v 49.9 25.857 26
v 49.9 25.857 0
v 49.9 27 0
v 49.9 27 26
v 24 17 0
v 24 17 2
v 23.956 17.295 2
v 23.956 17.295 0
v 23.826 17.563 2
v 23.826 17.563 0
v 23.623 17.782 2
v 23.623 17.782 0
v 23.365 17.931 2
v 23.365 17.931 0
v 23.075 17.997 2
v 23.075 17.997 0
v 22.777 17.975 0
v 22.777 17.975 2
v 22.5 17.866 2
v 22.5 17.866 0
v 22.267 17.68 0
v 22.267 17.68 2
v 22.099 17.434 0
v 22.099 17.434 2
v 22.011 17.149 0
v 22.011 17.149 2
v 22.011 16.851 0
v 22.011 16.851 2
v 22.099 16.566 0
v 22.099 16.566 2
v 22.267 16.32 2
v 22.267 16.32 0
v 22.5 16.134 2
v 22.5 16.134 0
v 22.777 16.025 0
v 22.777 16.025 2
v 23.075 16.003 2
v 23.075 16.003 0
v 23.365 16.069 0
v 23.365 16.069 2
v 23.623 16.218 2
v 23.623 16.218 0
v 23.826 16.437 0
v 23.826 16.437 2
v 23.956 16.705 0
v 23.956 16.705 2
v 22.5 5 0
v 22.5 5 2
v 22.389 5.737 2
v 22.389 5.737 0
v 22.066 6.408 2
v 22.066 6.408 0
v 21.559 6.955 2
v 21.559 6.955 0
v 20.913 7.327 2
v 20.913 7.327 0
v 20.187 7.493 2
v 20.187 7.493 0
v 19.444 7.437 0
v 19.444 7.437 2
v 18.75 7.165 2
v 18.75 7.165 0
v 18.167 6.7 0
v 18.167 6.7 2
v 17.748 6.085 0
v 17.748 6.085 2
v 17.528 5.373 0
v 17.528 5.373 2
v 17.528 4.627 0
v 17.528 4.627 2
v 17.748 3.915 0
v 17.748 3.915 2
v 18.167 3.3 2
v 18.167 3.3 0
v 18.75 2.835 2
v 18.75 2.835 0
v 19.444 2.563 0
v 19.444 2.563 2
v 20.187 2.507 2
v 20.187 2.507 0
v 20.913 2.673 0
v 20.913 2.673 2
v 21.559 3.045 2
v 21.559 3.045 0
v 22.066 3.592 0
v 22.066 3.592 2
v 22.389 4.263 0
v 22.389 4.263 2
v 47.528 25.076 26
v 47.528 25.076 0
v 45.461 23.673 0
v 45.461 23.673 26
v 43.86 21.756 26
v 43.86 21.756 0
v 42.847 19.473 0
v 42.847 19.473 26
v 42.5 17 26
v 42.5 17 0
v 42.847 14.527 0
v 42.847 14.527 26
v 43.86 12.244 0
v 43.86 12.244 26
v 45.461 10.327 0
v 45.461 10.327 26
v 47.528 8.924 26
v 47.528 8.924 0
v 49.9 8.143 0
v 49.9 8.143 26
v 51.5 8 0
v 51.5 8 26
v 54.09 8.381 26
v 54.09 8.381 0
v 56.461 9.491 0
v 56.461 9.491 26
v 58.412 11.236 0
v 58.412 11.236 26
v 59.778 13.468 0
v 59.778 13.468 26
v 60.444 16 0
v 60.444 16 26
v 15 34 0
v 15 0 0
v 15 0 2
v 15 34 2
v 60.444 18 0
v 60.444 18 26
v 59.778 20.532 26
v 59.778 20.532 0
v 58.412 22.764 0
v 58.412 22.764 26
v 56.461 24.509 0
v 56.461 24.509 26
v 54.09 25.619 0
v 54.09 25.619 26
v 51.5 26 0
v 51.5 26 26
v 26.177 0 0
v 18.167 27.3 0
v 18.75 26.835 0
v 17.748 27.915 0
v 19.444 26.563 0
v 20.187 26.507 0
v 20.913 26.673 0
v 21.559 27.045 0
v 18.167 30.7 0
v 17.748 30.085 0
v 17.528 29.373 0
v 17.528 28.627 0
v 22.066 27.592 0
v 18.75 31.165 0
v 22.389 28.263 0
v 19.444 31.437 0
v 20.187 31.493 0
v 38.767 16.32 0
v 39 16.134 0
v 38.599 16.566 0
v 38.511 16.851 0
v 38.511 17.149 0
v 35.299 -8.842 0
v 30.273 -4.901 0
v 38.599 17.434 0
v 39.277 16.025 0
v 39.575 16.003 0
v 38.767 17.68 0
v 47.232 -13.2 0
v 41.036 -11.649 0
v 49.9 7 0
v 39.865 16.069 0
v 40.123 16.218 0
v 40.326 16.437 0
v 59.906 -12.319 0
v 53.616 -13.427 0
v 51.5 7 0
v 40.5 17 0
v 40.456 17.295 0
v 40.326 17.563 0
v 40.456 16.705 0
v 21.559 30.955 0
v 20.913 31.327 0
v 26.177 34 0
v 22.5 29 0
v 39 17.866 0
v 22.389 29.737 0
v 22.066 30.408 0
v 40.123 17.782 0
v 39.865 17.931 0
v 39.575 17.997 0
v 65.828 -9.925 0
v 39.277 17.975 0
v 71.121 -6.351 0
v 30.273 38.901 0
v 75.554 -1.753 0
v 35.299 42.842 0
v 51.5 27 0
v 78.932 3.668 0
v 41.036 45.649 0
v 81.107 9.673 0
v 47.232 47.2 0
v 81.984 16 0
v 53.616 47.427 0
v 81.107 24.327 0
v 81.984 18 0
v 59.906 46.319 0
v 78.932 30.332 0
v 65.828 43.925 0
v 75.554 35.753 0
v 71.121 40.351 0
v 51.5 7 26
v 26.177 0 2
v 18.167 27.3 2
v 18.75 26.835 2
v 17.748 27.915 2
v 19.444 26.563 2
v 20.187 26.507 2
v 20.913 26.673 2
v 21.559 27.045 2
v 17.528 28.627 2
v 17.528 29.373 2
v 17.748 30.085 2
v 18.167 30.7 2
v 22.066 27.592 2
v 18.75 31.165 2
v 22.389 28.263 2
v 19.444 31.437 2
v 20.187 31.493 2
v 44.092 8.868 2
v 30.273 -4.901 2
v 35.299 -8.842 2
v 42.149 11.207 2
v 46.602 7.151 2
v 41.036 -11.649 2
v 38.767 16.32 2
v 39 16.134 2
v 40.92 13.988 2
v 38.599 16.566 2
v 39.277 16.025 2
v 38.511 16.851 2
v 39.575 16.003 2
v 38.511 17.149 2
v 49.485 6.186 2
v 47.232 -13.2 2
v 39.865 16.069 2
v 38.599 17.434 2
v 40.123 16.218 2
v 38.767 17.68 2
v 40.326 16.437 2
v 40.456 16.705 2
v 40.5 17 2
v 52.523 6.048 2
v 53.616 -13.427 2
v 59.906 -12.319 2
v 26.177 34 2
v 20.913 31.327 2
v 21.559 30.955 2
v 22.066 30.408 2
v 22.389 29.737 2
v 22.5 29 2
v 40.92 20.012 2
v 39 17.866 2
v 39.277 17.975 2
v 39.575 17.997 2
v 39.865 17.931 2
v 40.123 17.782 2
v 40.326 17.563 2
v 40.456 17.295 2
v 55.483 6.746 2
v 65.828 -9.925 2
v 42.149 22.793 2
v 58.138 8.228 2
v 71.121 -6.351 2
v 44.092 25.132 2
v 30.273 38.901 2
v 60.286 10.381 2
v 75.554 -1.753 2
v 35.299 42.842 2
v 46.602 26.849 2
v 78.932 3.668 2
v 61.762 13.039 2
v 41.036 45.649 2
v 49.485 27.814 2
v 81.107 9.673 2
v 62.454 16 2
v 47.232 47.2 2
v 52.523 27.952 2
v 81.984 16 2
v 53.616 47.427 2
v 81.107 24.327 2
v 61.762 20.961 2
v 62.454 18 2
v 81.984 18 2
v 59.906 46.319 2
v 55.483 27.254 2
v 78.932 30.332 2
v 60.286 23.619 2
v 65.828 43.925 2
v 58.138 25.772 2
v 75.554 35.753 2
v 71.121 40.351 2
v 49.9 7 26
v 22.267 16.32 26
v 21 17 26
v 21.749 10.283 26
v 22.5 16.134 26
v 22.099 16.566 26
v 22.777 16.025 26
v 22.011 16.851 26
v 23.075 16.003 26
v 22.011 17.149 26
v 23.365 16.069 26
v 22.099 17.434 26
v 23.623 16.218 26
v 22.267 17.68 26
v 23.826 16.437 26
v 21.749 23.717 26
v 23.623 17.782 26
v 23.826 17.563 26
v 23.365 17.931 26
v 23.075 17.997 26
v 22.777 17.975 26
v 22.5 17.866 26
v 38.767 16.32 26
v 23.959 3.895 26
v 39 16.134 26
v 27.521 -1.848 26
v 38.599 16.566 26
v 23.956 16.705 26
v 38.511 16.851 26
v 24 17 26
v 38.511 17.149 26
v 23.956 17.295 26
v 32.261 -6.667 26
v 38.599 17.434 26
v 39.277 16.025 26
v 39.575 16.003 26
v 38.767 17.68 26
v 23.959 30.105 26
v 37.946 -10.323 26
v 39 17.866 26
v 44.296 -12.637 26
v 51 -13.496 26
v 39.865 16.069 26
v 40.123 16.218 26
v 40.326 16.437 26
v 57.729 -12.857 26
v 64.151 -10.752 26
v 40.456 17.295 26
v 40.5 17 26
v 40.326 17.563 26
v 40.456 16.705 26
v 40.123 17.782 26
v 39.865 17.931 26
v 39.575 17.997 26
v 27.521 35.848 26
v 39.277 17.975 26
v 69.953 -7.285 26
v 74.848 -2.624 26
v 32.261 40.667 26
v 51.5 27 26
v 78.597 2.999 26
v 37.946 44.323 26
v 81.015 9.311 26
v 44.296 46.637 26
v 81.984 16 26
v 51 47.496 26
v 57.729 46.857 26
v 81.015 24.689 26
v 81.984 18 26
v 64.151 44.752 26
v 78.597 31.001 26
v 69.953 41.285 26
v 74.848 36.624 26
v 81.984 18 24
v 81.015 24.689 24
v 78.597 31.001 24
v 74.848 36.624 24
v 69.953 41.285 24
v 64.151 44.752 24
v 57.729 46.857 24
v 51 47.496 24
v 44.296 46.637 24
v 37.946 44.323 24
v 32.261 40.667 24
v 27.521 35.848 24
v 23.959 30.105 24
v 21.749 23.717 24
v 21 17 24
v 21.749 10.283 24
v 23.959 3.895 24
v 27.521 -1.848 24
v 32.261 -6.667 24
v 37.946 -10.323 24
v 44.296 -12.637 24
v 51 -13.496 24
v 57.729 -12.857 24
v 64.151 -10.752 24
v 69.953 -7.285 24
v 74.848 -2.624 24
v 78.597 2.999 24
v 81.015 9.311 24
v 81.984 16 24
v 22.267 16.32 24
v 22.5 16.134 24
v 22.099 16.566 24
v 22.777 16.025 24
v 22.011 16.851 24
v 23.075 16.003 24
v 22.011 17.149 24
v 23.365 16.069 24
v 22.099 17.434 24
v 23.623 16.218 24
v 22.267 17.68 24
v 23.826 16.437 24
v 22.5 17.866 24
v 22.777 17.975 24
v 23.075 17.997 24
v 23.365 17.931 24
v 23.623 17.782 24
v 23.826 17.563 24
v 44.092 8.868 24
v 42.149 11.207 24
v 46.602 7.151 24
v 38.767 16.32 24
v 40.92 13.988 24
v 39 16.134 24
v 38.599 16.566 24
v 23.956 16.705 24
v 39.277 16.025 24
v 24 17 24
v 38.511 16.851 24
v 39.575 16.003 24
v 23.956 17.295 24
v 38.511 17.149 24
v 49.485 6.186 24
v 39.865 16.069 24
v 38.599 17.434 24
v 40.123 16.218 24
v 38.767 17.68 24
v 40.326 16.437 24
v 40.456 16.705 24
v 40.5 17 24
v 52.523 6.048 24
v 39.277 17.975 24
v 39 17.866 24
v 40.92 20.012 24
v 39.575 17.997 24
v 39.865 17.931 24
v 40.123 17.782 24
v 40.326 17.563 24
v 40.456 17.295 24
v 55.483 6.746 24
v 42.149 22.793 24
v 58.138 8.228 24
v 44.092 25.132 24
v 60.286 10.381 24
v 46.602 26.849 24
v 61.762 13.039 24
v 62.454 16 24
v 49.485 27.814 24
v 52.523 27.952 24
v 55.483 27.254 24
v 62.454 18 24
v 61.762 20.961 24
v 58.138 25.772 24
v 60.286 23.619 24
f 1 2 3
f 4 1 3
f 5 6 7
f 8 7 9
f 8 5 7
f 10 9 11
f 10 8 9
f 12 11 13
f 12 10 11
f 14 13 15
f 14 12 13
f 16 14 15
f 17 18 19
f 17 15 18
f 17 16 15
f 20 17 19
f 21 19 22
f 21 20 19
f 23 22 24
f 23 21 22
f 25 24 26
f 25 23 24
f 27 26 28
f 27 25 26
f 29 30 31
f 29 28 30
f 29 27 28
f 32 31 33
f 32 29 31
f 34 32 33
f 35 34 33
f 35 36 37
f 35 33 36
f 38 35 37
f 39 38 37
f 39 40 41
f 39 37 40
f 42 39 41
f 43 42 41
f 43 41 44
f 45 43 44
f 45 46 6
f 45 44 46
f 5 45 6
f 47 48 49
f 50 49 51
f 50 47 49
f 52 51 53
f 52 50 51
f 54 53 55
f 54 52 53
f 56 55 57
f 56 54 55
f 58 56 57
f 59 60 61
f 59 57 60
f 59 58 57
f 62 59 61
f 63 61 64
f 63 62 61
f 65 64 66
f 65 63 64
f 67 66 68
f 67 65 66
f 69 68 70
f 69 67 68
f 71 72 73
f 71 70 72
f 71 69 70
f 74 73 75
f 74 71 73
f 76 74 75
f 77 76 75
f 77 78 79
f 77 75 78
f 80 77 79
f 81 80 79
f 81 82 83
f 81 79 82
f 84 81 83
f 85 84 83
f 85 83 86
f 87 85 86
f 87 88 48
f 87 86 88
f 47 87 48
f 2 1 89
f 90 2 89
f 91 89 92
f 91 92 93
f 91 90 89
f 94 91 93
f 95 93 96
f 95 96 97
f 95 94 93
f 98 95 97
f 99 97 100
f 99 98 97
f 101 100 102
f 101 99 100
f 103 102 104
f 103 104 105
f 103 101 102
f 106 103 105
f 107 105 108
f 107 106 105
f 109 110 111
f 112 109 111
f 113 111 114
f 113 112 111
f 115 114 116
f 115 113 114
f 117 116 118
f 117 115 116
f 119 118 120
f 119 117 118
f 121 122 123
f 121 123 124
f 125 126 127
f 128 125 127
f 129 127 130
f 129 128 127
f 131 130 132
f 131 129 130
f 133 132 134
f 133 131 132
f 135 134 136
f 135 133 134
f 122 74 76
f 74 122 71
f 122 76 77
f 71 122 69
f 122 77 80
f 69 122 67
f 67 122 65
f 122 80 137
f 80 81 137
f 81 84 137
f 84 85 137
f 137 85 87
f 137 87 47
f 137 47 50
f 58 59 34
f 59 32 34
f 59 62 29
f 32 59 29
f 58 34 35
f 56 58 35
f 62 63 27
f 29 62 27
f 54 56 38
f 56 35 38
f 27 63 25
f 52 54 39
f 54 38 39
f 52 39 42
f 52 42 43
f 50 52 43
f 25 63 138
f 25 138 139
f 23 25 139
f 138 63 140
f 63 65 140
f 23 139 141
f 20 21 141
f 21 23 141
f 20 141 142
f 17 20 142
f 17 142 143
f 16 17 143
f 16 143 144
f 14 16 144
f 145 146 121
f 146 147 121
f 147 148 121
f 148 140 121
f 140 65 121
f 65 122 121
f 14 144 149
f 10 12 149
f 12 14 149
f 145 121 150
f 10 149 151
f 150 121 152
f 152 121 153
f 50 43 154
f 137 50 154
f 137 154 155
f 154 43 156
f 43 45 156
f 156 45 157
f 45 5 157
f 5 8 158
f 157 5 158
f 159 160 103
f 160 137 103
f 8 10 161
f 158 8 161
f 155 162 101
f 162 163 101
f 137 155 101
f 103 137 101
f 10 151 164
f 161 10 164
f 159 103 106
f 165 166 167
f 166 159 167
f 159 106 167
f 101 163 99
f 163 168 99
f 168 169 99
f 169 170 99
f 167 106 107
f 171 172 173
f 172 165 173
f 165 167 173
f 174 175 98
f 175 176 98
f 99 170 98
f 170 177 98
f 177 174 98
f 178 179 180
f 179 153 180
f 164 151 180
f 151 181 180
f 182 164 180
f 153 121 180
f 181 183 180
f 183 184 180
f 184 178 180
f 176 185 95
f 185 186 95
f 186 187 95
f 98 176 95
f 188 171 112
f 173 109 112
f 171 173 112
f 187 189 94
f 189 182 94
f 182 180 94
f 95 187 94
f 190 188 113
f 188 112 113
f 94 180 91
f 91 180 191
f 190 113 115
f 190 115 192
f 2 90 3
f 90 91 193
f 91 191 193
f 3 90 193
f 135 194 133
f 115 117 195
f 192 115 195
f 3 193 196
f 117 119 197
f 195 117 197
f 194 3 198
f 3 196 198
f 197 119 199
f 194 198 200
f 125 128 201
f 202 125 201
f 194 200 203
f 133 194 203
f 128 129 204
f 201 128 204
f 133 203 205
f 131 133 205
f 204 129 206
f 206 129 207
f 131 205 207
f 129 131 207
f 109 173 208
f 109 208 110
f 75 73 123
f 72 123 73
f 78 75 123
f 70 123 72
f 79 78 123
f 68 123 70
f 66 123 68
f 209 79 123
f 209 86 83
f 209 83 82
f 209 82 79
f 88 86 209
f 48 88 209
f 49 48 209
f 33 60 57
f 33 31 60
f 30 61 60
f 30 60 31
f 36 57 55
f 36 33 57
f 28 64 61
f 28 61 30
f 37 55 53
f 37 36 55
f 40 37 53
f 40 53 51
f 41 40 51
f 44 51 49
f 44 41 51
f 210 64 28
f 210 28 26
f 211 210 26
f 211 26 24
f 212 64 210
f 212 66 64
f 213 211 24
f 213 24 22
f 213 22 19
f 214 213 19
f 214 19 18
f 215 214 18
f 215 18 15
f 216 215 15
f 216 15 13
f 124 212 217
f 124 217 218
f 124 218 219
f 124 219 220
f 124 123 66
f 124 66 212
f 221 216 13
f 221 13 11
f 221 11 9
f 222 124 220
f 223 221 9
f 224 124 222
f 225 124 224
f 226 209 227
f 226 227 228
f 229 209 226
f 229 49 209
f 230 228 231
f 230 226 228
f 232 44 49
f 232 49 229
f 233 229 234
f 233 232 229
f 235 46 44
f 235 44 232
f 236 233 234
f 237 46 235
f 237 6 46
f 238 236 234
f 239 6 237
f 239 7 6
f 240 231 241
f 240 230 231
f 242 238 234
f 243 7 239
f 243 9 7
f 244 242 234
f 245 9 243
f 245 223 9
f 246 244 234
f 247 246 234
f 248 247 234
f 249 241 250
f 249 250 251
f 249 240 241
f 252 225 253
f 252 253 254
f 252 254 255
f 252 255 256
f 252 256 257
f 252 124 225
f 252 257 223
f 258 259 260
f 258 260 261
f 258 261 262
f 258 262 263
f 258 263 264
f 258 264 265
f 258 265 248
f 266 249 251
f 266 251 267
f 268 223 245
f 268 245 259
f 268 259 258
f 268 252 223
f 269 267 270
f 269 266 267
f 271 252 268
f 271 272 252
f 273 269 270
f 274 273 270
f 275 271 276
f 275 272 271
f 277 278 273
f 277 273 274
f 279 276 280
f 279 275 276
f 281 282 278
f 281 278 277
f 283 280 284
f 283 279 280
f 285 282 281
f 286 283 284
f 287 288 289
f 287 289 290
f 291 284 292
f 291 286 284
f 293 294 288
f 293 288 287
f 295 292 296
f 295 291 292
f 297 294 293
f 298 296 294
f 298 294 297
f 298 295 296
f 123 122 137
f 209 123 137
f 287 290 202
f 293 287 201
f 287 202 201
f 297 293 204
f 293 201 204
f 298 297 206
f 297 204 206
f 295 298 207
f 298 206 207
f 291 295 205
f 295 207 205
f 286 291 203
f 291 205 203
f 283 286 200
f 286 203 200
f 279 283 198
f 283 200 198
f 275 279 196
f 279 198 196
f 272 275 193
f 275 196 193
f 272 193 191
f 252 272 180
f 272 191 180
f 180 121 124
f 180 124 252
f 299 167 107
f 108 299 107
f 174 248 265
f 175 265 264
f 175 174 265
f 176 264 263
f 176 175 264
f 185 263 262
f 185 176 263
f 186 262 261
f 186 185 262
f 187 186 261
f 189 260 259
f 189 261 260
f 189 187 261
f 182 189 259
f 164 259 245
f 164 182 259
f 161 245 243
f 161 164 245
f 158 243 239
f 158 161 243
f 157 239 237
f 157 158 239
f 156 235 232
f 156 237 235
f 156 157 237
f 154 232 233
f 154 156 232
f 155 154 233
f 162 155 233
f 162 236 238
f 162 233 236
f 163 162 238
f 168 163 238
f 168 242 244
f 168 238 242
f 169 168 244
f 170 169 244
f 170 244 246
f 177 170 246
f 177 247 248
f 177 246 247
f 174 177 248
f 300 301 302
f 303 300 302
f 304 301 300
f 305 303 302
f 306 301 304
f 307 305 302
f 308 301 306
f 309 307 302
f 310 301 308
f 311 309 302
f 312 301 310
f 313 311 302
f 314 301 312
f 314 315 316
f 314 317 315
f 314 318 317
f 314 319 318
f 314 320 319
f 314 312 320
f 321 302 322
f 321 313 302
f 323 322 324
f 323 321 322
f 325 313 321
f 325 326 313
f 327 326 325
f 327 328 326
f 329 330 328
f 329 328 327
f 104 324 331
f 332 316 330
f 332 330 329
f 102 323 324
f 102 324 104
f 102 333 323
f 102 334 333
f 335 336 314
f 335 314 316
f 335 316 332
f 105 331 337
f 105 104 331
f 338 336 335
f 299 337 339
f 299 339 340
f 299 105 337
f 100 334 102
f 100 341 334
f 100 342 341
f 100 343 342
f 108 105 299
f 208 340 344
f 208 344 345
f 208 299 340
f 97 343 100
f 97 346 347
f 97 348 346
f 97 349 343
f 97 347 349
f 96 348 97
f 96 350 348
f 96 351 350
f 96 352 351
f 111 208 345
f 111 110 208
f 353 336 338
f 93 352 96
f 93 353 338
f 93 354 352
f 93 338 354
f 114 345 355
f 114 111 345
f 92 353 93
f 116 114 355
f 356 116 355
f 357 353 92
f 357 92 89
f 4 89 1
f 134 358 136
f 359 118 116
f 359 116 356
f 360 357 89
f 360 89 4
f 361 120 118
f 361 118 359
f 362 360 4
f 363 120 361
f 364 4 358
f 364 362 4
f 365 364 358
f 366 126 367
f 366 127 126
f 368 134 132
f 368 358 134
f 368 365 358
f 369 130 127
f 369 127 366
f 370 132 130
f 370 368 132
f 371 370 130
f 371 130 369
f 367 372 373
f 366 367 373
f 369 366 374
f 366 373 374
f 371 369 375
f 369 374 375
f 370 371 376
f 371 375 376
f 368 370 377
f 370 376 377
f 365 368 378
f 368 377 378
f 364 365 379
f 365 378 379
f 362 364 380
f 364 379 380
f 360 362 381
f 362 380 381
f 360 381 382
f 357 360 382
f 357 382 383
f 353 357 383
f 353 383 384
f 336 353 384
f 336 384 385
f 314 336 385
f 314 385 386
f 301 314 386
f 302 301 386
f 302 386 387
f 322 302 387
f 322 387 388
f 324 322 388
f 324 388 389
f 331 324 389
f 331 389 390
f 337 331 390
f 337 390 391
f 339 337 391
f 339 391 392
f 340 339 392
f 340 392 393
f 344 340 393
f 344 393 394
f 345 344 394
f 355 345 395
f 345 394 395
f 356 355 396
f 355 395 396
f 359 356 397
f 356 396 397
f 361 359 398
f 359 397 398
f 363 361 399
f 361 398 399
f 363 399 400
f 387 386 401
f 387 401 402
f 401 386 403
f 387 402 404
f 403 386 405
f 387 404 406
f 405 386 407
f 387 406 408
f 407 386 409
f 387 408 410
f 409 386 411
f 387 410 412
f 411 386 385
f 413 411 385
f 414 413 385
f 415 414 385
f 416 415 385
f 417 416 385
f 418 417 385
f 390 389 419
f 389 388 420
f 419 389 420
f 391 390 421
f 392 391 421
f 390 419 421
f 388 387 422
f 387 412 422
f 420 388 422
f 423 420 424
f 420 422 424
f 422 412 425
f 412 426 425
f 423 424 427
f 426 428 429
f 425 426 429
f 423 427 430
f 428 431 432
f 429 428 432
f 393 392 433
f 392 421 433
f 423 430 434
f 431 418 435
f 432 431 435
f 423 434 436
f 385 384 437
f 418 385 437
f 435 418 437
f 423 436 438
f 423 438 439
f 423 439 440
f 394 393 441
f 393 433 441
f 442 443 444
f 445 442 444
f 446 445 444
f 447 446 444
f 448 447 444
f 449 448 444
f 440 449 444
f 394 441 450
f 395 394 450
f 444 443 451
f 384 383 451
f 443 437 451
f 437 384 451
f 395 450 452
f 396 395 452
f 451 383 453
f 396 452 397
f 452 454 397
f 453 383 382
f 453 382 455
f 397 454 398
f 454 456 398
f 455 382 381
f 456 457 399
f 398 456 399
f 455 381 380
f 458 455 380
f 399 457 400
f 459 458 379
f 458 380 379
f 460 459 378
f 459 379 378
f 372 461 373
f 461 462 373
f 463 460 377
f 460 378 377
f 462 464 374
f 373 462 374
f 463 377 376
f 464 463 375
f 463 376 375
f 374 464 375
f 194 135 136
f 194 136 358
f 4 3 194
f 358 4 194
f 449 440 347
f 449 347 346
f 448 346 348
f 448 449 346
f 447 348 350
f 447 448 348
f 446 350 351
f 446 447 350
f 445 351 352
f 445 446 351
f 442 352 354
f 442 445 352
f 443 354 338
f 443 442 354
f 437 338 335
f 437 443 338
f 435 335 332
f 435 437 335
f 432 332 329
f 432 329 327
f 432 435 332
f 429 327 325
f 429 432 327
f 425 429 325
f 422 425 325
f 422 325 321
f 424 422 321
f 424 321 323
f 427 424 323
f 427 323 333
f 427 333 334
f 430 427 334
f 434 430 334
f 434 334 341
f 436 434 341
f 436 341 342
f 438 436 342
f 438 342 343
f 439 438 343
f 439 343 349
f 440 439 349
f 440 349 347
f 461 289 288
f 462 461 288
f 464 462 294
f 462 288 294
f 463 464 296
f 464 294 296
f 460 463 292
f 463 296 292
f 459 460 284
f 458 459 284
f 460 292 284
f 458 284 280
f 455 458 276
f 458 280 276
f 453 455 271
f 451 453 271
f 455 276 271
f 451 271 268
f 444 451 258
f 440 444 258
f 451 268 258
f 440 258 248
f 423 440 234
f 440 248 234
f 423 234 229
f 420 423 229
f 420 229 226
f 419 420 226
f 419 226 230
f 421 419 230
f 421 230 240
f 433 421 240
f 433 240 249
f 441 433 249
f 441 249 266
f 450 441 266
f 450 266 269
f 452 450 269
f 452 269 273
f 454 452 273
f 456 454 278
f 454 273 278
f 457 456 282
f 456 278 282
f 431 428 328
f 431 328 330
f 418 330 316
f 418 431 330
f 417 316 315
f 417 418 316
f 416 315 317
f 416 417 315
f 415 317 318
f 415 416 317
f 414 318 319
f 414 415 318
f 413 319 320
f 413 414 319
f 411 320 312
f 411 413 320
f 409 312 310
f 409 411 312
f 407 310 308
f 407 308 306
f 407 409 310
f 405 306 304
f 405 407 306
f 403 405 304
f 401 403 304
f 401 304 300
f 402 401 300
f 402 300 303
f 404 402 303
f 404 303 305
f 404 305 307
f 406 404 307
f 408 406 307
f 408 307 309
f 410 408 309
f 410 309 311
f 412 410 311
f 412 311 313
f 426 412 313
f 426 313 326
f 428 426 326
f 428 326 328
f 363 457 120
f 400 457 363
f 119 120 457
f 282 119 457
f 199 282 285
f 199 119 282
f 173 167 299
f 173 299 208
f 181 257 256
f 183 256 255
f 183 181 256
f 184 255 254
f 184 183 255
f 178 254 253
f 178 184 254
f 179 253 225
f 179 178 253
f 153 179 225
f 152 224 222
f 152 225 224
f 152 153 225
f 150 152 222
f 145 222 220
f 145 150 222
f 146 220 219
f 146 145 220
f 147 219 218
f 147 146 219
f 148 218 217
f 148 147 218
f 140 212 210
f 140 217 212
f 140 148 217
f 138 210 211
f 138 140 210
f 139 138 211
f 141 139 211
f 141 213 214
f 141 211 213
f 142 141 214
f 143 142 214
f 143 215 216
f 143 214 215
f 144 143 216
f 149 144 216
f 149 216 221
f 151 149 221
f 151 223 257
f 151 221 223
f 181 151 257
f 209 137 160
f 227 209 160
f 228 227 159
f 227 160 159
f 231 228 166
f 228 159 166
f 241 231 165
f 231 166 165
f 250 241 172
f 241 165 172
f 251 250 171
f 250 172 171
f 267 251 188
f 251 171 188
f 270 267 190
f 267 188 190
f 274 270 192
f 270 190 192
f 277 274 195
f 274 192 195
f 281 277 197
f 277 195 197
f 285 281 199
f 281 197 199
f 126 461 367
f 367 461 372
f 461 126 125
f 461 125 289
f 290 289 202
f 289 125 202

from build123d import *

# Parameters (mm, degrees)
CYLINDER018_R     = 1
CYLINDER018_DEPTH = 26
CYLINDER019_R     = 1
CYLINDER019_DEPTH = 26
BOX007_W          = 30
BOX007_H          = 2
BOX007_DEPTH      = 26
CYLINDER016_R     = 2.5
CYLINDER016_DEPTH = 10
CYLINDER017_R     = 2.5
CYLINDER017_DEPTH = 10
BOX005_W          = 15
BOX005_H          = 34
BOX005_DEPTH      = 2
BOX004_W          = 1.6
BOX004_H          = 20
BOX004_DEPTH      = 26
CYLINDER010_R     = 11
CYLINDER010_DEPTH = 22
CYLINDER009_R     = 30.5
CYLINDER009_DEPTH = 22
CYLINDER008_R     = 9
CYLINDER008_DEPTH = 26
CYLINDER007_R     = 30.5
CYLINDER007_DEPTH = 26


with BuildPart() as cylinder018:
    # Cylinder018 → Cylinder018 (new body)
    with BuildSketch(Plane(origin=(39.5, 17, 0), x_dir=(1, 0, 0), z_dir=(0, 0, 1))):
        Circle(CYLINDER018_R)
    extrude(amount=CYLINDER018_DEPTH)


with BuildPart() as wireholes:
    # Cylinder019 → Cylinder019 (new body)
    with BuildSketch(Plane(origin=(23, 17, 0), x_dir=(1, 0, 0), z_dir=(0, 0, 1))):
        Circle(CYLINDER019_R)
    extrude(amount=CYLINDER019_DEPTH)

    # Fusion007: union Cylinder018
    add(cylinder018.part)


with BuildPart() as cube007:
    # Box007 → Box007 (new body)
    with BuildSketch(Plane(origin=(53, 16, 0), x_dir=(1, 0, 0), z_dir=(0, 0, 1))):
        with Locations((15, 1)):
            Rectangle(BOX007_W, BOX007_H)
    extrude(amount=BOX007_DEPTH)


with BuildPart() as cylinder016:
    # Cylinder016 → Cylinder016 (new body)
    with BuildSketch(Plane(origin=(20, 5, 0), x_dir=(1, 0, 0), z_dir=(0, 0, 1))):
        Circle(CYLINDER016_R)
    extrude(amount=CYLINDER016_DEPTH)


with BuildPart() as boreholem6screws002:
    # Cylinder017 → Cylinder017 (new body)
    with BuildSketch(Plane(origin=(20, 29, 0), x_dir=(1, 0, 0), z_dir=(0, 0, 1))):
        Circle(CYLINDER017_R)
    extrude(amount=CYLINDER017_DEPTH)

    # Fusion005: union Cylinder016
    add(cylinder016.part)


with BuildPart() as cut010:
    # Box005 → Box005 (new body)
    with BuildSketch(Plane(origin=(15, 0, 0), x_dir=(1, 0, 0), z_dir=(0, 0, 1))):
        with Locations((7.5, 17)):
            Rectangle(BOX005_W, BOX005_H)
    extrude(amount=BOX005_DEPTH)

    # Cut010: cut BoreholeM6Screws002
    add(boreholem6screws002.part, mode=Mode.SUBTRACT)


with BuildPart() as cube004:
    # Box004 → Box004 (new body)
    with BuildSketch(Plane(origin=(49.9, 7, 0), x_dir=(1, 0, 0), z_dir=(0, 0, 1))):
        with Locations((0.8, 10)):
            Rectangle(BOX004_W, BOX004_H)
    extrude(amount=BOX004_DEPTH)


with BuildPart() as cylinder010:
    # Cylinder010 → Cylinder010 (new body)
    with BuildSketch(Plane.XY):
        Circle(CYLINDER010_R)
    extrude(amount=CYLINDER010_DEPTH)


with BuildPart() as coilarea:
    # Cylinder009 → Cylinder009 (new body)
    with BuildSketch(Plane.XY):
        Circle(CYLINDER009_R)
    extrude(amount=CYLINDER009_DEPTH)

    # Cut004: cut Cylinder010
    add(cylinder010.part, mode=Mode.SUBTRACT)


with BuildPart() as coilarea_1:
    # Cut004 placement: moved
    add(coilarea.part.moved(Location((51.5, 17, 2))))


with BuildPart() as cylinder008:
    # Cylinder008 → Cylinder008 (new body)
    with BuildSketch(Plane.XY):
        Circle(CYLINDER008_R)
    extrude(amount=CYLINDER008_DEPTH)


with BuildPart() as coilholder:
    # Cylinder007 → Cylinder007 (new body)
    with BuildSketch(Plane.XY):
        Circle(CYLINDER007_R)
    extrude(amount=CYLINDER007_DEPTH)

    # Cut002: cut Cylinder008
    add(cylinder008.part, mode=Mode.SUBTRACT)


with BuildPart() as coilholder_1:
    # Cut002 placement: moved
    add(coilholder.part.moved(Location((51.5, 17, 0))))

    # Cut005: cut CoilArea
    add(coilarea_1.part, mode=Mode.SUBTRACT)

    # Cut007: cut Cube004
    add(cube004.part, mode=Mode.SUBTRACT)

    # Fusion006: union Cut010
    add(cut010.part)

    # Cut012: cut Cube007
    add(cube007.part, mode=Mode.SUBTRACT)

    # Cut013: cut WireHoles
    add(wireholes.part, mode=Mode.SUBTRACT)


solid = coilholder_1.part
